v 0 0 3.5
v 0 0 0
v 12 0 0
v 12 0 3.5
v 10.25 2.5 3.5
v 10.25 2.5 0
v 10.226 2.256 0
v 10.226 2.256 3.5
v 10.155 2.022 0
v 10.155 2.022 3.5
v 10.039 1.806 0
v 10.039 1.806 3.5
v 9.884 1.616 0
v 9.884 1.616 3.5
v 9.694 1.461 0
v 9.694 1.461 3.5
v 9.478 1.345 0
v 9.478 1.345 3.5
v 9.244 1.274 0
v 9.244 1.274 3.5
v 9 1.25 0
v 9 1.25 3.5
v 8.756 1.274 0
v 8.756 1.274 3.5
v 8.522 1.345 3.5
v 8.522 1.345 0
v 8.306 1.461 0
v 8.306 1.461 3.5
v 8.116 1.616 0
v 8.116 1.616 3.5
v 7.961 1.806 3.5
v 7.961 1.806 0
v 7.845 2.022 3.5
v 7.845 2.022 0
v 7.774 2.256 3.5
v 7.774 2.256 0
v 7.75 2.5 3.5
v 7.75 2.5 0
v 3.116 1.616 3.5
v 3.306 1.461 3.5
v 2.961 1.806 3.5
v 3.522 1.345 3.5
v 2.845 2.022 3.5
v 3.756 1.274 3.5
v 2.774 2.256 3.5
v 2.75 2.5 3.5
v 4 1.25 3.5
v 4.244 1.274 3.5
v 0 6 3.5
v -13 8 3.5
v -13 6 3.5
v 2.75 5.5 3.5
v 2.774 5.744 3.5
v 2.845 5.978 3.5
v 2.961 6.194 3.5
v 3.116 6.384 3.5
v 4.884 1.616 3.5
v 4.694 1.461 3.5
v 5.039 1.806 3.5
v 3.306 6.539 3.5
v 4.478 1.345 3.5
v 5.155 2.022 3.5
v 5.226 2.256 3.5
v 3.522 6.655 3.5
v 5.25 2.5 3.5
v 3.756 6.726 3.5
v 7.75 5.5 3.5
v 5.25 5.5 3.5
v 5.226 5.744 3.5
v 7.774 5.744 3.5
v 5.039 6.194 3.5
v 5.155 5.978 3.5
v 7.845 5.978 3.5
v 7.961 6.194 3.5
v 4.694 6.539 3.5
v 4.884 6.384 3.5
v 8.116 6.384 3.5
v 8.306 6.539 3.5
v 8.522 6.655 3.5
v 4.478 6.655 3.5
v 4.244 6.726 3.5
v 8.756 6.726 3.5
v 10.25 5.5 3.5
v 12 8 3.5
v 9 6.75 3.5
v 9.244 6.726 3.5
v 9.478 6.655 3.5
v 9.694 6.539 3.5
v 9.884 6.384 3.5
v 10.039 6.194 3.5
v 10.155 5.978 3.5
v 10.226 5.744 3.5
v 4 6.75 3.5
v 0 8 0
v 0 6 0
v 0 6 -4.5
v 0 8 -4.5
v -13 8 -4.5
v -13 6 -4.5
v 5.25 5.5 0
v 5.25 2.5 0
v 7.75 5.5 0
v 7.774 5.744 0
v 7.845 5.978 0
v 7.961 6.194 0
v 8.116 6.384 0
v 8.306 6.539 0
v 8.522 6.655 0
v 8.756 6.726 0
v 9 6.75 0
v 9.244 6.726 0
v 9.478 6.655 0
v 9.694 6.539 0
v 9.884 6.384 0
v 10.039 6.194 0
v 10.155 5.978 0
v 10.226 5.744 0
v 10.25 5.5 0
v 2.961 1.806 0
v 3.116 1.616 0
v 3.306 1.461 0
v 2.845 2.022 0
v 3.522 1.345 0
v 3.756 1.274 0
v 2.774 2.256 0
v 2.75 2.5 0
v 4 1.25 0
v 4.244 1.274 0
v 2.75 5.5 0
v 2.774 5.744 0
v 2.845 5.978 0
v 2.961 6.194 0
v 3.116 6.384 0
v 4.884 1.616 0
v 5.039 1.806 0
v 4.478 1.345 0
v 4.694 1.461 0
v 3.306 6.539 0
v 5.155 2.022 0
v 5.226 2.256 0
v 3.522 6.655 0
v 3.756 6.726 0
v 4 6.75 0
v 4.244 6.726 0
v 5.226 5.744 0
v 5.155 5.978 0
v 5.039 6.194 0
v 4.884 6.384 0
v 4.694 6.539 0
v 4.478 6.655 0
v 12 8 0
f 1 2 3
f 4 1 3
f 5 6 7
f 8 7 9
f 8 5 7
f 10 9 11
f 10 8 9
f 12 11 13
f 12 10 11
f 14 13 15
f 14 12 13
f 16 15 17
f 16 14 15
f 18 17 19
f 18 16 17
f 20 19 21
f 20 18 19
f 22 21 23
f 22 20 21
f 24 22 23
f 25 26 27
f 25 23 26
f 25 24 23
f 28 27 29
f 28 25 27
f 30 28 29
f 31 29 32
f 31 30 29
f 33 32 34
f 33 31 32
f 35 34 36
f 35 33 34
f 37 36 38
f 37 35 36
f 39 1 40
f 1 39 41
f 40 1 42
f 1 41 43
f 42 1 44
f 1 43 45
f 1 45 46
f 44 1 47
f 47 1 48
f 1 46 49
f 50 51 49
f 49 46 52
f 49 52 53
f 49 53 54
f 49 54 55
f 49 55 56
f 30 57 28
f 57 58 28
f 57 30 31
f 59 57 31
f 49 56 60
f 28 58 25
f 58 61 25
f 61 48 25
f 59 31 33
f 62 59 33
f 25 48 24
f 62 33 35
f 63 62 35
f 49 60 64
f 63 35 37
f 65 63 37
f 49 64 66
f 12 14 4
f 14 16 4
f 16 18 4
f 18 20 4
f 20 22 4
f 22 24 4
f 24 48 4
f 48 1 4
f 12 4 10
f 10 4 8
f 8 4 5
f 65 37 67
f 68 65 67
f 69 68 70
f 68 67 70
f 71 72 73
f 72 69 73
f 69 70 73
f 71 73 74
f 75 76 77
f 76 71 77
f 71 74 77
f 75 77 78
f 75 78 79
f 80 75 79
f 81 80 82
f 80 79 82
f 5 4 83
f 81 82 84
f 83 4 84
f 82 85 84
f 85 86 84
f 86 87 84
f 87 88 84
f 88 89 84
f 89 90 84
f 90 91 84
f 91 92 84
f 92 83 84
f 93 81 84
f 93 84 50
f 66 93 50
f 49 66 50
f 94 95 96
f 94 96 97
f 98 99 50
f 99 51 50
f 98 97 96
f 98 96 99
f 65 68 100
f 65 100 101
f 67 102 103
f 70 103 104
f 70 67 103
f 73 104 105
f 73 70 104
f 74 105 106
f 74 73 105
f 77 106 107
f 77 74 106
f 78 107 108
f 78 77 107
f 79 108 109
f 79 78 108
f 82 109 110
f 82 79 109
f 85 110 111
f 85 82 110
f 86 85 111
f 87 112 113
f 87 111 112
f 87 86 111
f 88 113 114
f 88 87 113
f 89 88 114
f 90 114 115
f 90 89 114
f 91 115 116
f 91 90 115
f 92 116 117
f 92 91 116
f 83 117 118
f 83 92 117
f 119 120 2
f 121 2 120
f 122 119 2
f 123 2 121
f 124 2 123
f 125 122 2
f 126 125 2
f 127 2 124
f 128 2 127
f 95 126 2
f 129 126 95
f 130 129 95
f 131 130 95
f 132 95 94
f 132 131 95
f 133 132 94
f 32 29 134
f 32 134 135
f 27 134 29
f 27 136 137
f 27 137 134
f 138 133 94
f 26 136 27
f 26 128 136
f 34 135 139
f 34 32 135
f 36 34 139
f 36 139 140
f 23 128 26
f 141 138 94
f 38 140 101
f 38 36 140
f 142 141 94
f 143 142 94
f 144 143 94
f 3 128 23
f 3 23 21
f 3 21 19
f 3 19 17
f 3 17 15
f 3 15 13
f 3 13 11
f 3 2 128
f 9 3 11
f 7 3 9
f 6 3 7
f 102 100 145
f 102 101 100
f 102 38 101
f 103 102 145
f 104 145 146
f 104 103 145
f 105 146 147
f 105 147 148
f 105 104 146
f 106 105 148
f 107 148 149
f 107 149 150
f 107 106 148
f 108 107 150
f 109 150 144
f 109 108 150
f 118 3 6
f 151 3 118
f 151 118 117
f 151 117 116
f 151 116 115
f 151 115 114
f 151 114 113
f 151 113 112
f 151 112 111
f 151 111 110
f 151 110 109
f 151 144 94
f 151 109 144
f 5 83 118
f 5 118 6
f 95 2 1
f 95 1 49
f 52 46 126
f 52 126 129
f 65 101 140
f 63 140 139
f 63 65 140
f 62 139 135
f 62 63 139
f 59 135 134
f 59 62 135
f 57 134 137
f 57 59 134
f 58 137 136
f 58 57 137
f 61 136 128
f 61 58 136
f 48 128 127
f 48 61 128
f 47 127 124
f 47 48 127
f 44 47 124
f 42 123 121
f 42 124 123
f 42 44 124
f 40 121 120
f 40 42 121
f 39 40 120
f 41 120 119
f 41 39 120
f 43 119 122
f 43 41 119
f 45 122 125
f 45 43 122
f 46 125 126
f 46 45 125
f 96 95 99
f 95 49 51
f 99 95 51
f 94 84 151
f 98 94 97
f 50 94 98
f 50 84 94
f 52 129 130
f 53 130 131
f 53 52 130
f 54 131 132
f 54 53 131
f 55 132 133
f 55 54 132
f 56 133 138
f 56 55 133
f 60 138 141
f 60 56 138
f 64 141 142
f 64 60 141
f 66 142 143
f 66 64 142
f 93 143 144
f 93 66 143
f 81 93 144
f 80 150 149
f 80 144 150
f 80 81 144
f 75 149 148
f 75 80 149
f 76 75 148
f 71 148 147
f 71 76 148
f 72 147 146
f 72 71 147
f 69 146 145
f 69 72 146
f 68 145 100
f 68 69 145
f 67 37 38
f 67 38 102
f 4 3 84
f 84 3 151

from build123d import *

# Parameters (mm, degrees)
SKETCH1_W           = 12
SKETCH1_H           = 8
BOSS_EXTRUDE1_DEPTH = 3.5
CUT_EXTRUDE1_DEPTH  = 4.5
SKETCH3_W           = 3.5
SKETCH3_H           = 2
BOSS_EXTRUDE2_DEPTH = 13
SKETCH4_W           = 13
SKETCH4_H           = 2
BOSS_EXTRUDE3_DEPTH = 4.5


with BuildPart() as part:
    # Sketch1 → Boss-Extrude1 (new body)
    with BuildSketch(Plane.XY):
        with Locations((6, 4)):
            Rectangle(SKETCH1_W, SKETCH1_H)
    extrude(amount=BOSS_EXTRUDE1_DEPTH)

    # Sketch2 → Cut-Extrude1 (cut, through all)
    with BuildSketch(Plane.XY.offset(3.5)):
        with BuildLine():
            Line((5.25, 5.5), (5.25, 2.5))
            ThreePointArc((5.25, 2.5), (4, 1.25), (2.75, 2.5))
            Line((2.75, 2.5), (2.75, 5.5))
            ThreePointArc((2.75, 5.5), (4, 6.75), (5.25, 5.5))
        make_face()
        with BuildLine():
            Line((10.25, 5.5), (10.25, 2.5))
            ThreePointArc((10.25, 2.5), (9, 1.25), (7.75, 2.5))
            Line((7.75, 2.5), (7.75, 5.5))
            ThreePointArc((7.75, 5.5), (9, 6.75), (10.25, 5.5))
        make_face()
    extrude(amount=-CUT_EXTRUDE1_DEPTH, mode=Mode.SUBTRACT)

    # Sketch3 → Boss-Extrude2 (add)
    with BuildSketch(Plane.ZY):
        with Locations((1.75, 7)):
            Rectangle(SKETCH3_W, SKETCH3_H)
    extrude(amount=BOSS_EXTRUDE2_DEPTH)

    # Sketch4 → Boss-Extrude3 (add)
    with BuildSketch(Plane(origin=(0, 0, 0), x_dir=(-1, 0, 0), z_dir=(0, 0, -1))):
        with Locations((6.5, 7)):
            Rectangle(SKETCH4_W, SKETCH4_H)
    extrude(amount=BOSS_EXTRUDE3_DEPTH)


solid = part.part
